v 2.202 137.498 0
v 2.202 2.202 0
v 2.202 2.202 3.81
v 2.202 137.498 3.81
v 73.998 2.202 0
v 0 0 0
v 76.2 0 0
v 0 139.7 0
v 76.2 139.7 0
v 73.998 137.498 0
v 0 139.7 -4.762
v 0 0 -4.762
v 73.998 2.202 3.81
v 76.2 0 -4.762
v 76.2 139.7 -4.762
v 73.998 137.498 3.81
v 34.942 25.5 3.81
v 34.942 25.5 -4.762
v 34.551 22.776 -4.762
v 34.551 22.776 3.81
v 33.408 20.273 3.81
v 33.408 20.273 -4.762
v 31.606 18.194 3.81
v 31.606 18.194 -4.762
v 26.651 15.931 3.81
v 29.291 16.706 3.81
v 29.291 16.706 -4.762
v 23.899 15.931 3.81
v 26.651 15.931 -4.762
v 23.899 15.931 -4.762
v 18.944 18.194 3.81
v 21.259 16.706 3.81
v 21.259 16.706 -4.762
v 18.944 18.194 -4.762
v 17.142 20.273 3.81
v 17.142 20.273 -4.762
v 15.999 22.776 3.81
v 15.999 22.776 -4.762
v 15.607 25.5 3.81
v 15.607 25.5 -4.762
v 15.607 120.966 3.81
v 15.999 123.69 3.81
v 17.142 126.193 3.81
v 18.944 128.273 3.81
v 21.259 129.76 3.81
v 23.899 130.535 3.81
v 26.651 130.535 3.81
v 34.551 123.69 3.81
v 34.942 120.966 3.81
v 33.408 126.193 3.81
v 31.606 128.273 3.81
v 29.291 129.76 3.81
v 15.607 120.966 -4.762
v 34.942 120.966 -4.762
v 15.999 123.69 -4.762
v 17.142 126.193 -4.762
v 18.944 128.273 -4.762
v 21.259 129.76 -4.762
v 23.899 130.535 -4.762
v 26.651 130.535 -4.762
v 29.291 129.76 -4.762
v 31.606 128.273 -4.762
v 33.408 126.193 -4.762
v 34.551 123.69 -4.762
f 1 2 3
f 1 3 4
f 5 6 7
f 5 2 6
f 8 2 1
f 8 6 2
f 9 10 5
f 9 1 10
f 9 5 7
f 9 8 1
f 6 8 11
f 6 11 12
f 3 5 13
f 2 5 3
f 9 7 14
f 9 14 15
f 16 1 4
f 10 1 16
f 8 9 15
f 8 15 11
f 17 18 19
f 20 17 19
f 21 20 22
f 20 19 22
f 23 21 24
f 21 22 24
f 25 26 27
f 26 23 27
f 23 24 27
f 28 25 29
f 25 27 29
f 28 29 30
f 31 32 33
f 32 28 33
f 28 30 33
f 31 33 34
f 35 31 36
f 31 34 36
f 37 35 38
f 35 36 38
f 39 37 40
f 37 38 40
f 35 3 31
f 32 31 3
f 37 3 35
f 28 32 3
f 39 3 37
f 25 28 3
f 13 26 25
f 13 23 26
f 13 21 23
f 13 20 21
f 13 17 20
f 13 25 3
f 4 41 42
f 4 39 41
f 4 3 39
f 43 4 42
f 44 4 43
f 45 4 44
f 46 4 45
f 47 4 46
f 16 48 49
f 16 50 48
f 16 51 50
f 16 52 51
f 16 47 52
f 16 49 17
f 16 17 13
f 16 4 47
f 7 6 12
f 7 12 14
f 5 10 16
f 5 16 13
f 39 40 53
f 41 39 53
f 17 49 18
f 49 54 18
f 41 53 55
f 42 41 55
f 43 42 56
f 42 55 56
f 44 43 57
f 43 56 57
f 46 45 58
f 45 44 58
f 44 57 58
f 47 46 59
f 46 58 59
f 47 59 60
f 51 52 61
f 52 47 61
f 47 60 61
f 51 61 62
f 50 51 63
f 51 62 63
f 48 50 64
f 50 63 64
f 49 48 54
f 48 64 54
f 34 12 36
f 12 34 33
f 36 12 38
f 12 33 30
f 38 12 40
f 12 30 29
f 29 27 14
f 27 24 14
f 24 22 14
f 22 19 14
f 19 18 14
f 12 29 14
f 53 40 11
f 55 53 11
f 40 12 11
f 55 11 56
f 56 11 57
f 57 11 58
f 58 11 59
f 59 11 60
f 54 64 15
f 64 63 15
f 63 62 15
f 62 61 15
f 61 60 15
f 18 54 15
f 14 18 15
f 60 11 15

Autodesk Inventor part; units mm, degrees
ref_plane "YZ Plane" through (0, 0, 0) normal (1, 0, 0) x (0, 1, 0)
ref_plane "XZ Plane" through (0, 0, 0) normal (0, 1, 0) x (-1, 0, 0)
ref_plane "XY Plane" through (0, 0, 0) normal (0, 0, 1) x (1, 0, 0)
sketch "Sketch1" plane through (0, 0, 0) normal (0, 0, 1) x (1, 0, 0)
  line L0 (0, 0) -> (76.2, 0)
  line L1 (76.2, 0) -> (76.2, 139.7)
  line L2 (76.2, 139.7) -> (0, 139.7)
  line L3 (0, 139.7) -> (0, 0)
  line L4 (15.6073, 25.4999) -> (15.6073, 120.9664)
  arc A0 (34.9423, 120.9664) -> (15.6073, 120.9664) centre (25.2748, 120.9664) ccw
  line L5 (34.9423, 120.9664) -> (34.9423, 25.4999)
  arc A1 (15.6073, 25.4999) -> (34.9423, 25.4999) centre (25.2748, 25.4999) ccw
  line L6 (2.202, 137.498) -> (73.998, 137.498)
  line L7 (73.998, 137.498) -> (73.998, 2.202)
  line L8 (73.998, 2.202) -> (2.202, 2.202)
  line L9 (2.202, 2.202) -> (2.202, 137.498)
  dimension "d0" = 76.2
  dimension "d1" = 139.7
extrude "Extrusion1" add sketch "Sketch1" against normal blind 4.7625 contours L3 L2 L1 L0 | L6 L7 L8 L9
extrude "Extrusion2" add sketch "Sketch1" along normal blind 3.81 contours L6 L7 L8 L9
properties part number "Shifter surround"
